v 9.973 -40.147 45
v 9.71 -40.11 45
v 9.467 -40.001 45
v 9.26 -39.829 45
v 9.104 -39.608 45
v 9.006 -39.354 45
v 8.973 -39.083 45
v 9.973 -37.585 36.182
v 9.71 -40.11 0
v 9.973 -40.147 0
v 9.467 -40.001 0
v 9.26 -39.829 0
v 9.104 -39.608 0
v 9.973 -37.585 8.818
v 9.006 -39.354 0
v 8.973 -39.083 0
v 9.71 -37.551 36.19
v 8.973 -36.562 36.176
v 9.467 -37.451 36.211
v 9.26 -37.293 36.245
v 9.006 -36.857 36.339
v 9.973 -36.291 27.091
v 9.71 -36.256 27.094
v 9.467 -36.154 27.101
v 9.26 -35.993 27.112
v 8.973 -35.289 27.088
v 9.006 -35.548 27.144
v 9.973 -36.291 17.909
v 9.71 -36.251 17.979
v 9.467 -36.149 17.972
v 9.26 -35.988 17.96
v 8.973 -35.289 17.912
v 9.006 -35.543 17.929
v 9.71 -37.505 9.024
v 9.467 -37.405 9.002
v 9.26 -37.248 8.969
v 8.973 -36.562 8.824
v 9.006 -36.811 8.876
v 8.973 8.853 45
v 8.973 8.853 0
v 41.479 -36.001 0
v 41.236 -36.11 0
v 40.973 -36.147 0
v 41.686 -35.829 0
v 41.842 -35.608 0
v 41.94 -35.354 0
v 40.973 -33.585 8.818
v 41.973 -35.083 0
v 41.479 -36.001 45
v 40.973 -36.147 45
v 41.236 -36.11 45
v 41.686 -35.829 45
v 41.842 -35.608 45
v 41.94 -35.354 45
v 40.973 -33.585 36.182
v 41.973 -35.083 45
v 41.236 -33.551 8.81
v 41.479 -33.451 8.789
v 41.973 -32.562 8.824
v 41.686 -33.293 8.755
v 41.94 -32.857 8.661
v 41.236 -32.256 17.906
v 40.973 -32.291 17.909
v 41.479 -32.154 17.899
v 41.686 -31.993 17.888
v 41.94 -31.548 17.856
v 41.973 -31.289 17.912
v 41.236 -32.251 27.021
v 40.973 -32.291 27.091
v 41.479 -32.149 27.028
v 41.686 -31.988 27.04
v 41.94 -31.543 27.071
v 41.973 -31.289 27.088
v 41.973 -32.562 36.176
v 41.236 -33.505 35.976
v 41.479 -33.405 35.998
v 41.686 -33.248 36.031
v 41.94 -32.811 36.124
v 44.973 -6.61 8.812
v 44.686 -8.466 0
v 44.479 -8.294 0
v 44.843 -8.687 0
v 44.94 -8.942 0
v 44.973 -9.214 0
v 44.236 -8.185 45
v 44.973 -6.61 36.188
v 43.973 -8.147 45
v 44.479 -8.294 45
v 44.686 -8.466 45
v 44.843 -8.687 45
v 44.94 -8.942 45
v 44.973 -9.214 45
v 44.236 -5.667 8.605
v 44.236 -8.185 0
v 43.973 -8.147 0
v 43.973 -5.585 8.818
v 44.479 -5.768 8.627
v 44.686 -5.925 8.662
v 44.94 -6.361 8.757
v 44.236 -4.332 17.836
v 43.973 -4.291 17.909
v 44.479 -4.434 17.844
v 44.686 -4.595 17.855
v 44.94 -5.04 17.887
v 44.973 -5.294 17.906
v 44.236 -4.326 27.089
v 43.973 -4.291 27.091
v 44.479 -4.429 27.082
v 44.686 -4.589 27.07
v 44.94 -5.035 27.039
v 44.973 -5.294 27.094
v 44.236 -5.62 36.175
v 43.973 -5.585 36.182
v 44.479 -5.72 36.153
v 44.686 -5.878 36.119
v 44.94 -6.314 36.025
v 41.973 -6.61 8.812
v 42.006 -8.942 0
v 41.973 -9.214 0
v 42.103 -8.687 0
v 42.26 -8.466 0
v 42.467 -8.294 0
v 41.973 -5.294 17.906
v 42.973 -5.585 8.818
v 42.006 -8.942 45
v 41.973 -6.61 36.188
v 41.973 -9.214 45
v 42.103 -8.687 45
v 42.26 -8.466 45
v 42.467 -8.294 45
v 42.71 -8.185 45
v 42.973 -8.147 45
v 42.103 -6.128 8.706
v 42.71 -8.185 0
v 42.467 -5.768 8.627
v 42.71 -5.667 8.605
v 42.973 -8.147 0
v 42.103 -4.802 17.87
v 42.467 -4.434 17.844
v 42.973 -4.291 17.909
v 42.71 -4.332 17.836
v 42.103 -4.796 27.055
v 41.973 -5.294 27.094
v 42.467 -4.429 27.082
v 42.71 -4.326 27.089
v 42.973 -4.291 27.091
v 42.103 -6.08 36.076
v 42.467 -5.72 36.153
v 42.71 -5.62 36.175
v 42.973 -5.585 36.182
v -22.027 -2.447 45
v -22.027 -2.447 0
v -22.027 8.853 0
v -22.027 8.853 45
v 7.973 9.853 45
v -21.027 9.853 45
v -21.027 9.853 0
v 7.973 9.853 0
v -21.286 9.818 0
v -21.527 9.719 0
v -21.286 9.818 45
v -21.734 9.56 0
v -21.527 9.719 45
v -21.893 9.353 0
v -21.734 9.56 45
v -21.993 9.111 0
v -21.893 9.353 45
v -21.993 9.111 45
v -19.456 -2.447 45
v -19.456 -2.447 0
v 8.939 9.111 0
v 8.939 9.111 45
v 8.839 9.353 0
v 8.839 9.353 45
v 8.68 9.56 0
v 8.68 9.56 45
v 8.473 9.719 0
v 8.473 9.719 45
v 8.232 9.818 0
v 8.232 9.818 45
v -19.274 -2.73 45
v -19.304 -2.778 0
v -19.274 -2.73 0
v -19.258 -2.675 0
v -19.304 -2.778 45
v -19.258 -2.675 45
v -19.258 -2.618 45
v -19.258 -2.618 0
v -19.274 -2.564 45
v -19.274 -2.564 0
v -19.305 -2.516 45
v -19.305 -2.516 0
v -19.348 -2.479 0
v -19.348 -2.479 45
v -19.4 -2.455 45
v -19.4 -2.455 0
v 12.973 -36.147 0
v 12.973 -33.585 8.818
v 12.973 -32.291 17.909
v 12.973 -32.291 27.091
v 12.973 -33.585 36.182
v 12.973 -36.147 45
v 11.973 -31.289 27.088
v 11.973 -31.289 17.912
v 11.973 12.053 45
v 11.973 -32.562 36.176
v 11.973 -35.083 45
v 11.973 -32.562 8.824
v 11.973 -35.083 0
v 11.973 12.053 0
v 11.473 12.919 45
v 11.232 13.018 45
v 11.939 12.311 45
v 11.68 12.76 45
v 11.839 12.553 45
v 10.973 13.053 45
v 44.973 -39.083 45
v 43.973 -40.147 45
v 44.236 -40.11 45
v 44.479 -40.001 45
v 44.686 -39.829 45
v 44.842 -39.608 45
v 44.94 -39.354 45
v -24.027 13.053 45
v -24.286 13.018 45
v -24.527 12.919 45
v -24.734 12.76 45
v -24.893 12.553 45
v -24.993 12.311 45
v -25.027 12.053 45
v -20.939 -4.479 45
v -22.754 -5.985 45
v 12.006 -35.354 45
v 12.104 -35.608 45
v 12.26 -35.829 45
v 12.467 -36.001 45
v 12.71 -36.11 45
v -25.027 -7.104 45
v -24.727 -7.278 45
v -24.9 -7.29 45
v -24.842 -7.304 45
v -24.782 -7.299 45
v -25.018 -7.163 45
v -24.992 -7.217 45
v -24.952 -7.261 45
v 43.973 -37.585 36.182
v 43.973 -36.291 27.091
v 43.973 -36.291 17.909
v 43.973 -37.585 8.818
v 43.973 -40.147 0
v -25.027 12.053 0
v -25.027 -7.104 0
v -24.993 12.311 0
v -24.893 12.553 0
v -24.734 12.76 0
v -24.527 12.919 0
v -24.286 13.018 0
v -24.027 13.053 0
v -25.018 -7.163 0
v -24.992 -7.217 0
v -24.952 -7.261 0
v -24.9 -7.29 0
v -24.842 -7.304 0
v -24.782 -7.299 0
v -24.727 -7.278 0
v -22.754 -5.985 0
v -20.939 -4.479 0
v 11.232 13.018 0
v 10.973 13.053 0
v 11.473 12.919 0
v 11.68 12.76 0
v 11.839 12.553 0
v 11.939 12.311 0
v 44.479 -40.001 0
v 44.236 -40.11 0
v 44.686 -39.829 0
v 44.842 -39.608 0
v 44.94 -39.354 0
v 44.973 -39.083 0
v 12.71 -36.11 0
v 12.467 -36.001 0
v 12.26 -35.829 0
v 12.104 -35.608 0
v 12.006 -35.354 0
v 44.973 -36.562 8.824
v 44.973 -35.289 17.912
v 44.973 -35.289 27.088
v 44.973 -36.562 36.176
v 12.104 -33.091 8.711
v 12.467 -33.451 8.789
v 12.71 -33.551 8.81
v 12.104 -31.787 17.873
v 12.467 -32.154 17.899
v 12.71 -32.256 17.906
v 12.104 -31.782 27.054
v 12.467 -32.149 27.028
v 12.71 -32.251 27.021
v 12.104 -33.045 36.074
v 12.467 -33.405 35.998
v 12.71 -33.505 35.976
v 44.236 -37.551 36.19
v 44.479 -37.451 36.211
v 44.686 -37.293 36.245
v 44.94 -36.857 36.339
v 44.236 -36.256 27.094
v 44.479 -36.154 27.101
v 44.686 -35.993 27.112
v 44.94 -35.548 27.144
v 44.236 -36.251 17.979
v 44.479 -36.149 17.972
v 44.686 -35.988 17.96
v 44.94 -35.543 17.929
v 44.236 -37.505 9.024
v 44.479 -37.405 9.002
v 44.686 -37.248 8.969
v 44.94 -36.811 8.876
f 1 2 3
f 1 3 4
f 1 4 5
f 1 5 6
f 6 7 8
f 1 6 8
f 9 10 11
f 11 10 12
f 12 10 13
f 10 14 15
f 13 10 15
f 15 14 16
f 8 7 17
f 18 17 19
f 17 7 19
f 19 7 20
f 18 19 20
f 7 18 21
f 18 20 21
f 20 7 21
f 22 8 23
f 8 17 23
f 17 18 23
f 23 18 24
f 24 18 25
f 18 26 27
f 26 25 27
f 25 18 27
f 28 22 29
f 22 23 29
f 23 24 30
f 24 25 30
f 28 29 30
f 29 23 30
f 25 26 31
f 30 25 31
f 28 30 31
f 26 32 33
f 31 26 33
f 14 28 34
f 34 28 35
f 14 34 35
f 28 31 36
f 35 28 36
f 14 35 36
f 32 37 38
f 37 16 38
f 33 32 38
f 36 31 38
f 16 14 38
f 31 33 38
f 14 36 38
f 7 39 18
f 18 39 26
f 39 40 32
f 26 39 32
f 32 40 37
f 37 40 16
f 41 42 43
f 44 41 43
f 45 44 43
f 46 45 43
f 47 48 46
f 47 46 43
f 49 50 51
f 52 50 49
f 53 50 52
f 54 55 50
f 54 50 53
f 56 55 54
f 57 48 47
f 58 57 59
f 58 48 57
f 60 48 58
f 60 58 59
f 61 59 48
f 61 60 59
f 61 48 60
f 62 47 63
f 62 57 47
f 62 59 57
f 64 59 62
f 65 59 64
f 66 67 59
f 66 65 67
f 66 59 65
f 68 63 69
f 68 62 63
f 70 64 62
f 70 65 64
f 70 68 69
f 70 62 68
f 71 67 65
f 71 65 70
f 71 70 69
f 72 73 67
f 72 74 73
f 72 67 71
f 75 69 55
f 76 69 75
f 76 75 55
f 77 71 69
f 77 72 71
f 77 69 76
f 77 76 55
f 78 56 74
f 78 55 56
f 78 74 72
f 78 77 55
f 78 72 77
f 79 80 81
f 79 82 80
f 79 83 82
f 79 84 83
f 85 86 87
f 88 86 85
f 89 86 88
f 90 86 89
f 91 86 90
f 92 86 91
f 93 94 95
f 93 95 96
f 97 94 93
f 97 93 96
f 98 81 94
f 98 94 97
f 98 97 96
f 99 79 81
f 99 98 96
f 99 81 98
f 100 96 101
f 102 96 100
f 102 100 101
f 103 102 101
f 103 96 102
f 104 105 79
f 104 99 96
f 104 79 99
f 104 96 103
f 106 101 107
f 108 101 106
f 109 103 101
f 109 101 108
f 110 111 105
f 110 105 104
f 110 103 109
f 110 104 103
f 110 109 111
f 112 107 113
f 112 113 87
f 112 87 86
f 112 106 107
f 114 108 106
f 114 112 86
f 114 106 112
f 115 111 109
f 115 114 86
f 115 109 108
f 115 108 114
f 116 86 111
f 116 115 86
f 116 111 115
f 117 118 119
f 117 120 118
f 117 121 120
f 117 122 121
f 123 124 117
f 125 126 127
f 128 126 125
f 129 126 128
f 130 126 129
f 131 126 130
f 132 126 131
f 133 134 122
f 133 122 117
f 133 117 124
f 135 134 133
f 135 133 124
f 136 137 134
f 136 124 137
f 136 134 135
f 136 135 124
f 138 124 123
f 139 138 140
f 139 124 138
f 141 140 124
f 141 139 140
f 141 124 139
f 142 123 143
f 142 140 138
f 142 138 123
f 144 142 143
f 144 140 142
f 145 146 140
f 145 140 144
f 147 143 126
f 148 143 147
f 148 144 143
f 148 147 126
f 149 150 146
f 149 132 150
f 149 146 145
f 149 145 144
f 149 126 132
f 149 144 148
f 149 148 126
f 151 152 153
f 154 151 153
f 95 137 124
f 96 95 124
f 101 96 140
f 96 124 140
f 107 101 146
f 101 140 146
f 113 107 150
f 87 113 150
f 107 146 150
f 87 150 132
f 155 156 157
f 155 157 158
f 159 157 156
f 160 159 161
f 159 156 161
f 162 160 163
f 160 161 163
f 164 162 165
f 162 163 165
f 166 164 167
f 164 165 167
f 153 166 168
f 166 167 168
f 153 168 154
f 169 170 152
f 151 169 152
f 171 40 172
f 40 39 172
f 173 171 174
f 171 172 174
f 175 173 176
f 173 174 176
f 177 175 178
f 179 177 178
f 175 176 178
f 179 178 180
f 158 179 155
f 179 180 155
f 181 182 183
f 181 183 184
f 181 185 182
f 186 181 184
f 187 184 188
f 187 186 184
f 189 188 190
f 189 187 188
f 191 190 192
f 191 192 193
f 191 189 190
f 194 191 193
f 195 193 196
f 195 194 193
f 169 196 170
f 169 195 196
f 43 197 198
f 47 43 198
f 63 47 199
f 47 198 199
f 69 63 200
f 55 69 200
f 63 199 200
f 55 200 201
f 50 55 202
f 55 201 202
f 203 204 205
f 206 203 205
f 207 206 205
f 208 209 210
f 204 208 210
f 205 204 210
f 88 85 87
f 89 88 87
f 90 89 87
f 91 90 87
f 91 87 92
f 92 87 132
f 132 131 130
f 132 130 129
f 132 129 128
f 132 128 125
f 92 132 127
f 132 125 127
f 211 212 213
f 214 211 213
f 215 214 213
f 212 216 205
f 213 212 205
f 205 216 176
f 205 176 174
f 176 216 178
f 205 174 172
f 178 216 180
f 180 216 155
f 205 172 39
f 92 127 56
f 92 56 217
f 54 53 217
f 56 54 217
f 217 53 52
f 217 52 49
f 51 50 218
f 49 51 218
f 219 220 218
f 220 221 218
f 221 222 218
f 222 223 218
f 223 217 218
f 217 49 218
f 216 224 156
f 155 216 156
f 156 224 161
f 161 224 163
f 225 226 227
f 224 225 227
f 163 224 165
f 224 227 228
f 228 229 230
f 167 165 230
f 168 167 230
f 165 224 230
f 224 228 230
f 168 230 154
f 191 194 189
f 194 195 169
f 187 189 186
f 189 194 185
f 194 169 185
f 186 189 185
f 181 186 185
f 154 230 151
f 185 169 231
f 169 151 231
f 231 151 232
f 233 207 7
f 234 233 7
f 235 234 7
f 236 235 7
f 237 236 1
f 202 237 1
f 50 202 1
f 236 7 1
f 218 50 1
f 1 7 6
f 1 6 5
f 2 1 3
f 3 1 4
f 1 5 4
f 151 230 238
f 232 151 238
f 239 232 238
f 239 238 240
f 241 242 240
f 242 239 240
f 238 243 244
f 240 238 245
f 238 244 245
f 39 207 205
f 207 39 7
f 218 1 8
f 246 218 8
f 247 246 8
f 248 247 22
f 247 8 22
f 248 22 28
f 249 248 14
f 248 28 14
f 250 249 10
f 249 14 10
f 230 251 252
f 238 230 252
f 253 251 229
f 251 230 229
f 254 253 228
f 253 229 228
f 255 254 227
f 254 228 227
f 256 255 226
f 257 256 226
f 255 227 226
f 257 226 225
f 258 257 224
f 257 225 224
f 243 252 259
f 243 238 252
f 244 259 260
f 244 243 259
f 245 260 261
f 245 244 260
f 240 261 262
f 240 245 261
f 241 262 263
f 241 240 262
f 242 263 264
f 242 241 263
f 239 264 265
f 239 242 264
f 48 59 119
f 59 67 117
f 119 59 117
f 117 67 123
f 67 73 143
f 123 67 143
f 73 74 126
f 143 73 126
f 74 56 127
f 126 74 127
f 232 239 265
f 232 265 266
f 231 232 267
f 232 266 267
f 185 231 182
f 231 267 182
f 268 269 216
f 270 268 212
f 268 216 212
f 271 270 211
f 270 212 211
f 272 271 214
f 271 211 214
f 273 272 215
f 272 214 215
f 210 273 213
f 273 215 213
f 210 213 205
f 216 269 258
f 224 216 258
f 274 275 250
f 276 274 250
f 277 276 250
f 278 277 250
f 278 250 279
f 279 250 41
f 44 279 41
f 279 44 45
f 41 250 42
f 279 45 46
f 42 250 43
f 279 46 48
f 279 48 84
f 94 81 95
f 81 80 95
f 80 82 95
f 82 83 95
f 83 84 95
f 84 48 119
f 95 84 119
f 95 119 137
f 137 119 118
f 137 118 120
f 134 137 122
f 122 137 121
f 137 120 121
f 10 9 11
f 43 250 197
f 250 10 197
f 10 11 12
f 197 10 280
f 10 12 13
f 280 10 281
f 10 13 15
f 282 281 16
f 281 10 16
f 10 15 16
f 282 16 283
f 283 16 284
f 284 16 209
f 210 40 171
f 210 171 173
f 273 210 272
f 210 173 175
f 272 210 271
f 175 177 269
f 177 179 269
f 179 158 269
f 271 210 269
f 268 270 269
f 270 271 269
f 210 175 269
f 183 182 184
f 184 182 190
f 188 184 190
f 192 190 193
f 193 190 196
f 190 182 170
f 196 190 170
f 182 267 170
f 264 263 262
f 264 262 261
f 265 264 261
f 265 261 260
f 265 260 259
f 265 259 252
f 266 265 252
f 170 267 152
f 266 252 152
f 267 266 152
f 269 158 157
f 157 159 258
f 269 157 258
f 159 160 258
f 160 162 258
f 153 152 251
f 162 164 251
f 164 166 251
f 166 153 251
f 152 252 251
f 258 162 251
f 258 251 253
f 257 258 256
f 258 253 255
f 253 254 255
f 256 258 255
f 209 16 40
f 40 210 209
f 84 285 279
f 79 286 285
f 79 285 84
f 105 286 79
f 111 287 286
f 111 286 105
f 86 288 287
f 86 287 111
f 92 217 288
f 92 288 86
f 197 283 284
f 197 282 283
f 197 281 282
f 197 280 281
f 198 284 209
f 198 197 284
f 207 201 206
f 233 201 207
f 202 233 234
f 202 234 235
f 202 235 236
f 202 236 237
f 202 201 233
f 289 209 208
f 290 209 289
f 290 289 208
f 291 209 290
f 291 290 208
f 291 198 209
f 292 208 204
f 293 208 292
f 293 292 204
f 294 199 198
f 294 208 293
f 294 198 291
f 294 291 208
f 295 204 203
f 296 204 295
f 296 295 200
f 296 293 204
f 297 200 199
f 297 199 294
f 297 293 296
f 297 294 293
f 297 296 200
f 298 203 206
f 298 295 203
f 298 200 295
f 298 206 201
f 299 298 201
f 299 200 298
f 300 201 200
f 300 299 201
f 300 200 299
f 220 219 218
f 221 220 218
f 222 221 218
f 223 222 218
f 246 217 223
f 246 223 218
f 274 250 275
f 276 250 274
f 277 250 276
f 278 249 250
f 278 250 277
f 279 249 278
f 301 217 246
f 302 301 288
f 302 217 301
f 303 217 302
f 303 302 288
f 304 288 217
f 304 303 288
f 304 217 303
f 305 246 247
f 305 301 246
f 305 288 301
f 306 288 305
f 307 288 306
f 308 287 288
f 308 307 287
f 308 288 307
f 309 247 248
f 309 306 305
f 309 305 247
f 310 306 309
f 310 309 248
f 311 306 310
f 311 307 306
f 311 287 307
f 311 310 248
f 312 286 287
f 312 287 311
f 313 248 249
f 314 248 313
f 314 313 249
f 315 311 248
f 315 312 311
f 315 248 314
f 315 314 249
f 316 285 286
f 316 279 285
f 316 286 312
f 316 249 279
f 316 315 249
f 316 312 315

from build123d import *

# Parameters (mm, degrees)
F1_DEPTH = 45
F3_DEPTH = 30
F4_DEPTH = 3
F6_DEPTH = 3
F7_R     = 1
F8_R     = 0.2


with BuildPart() as f1:
    # F0 (on Top) → F1 (new body)
    with BuildSketch(Plane.XY):
        with BuildLine():
            Line((-22.0269914716, 9.8525723957), (8.9730085284, 9.8525723957))
            Line((8.9730085284, 9.8525723957), (8.9730085284, -40.1474276043))
            Line((8.9730085284, -40.1474276043), (11.9730085284, -40.1474276043))
            Line((11.9730085284, -40.1474276043), (11.9730085284, 13.0525723957))
            Line((11.9730085284, 13.0525723957), (-25.0269914716, 13.0525723957))
            Line((-25.0269914716, 13.0525723957), (-25.0269914716, -7.4474276043))
            ThreePointArc((-25.0269914716, -7.4474276043), (-21.791751143, -5.2297159987), (-19.0269914716, -2.4474276043))
            Line((-19.0269914716, -2.4474276043), (-22.0269914716, -2.4474276043))
            Line((-22.0269914716, -2.4474276043), (-22.0269914716, 9.8525723957))
        make_face()
    extrude(amount=F1_DEPTH)

    # F2 (on face) → F3 (join)
    with BuildSketch(Plane.YZ.offset(11.9730085284)):
        with BuildLine():
            Line((-40.1474276043, 0), (-36.1474276043, 0))
            ThreePointArc((-36.1474276043, 0), (-32.1289821926, 22.5), (-36.1474276043, 45))
            Line((-36.1474276043, 45), (-40.1474276043, 45))
            ThreePointArc((-40.1474276043, 45), (-36.1289821926, 22.5), (-40.1474276043, 0))
        make_face()
    extrude(amount=F3_DEPTH)

    # F4 (cut): a face of the model
    f4_faces = [f1.faces().sort_by_distance(p)[0] for p in [
        (11.9730085284, -38.5357130978, 22.5),
    ]]
    extrude(f4_faces, amount=-F4_DEPTH, mode=Mode.SUBTRACT)

    # F5 (on face) → F6 (join)
    with BuildSketch(Plane.YZ.offset(41.9730085284)):
        with BuildLine():
            ThreePointArc((-40.1474276043, 45), (-36.1289821926, 22.5), (-40.1474276043, 0))
            Line((-40.1474276043, 0), (-8.1474276043, 0))
            ThreePointArc((-8.1474276043, 0), (-4.1289821926, 22.5), (-8.1474276043, 45))
            Line((-8.1474276043, 45), (-40.1474276043, 45))
        make_face()
    extrude(amount=F6_DEPTH)

    # F7
    f7_edges = [f1.edges().sort_by_distance(p)[0] for p in [
        (11.973009, 13.052572, 22.5),
        (-25.026991, 13.052572, 22.5),
        (-22.026991, 9.852572, 22.5),
        (8.973009, 9.852572, 22.5),
        (8.973009, -36.128982, 22.5),
        (44.973009, -36.128982, 22.5),
        (44.973009, -4.128982, 22.5),
        (41.973009, -4.128982, 22.5),
        (41.973009, -32.128982, 22.5),
        (11.973009, -32.128982, 22.5),
    ]]
    fillet(f7_edges, radius=F7_R)

    # F8
    f8_edges = [f1.edges().sort_by_distance(p)[0] for p in [
        (-19.026991, -2.447428, 22.5),
        (-25.026991, -7.447428, 22.5),
    ]]
    fillet(f8_edges, radius=F8_R)


solid = f1.part
